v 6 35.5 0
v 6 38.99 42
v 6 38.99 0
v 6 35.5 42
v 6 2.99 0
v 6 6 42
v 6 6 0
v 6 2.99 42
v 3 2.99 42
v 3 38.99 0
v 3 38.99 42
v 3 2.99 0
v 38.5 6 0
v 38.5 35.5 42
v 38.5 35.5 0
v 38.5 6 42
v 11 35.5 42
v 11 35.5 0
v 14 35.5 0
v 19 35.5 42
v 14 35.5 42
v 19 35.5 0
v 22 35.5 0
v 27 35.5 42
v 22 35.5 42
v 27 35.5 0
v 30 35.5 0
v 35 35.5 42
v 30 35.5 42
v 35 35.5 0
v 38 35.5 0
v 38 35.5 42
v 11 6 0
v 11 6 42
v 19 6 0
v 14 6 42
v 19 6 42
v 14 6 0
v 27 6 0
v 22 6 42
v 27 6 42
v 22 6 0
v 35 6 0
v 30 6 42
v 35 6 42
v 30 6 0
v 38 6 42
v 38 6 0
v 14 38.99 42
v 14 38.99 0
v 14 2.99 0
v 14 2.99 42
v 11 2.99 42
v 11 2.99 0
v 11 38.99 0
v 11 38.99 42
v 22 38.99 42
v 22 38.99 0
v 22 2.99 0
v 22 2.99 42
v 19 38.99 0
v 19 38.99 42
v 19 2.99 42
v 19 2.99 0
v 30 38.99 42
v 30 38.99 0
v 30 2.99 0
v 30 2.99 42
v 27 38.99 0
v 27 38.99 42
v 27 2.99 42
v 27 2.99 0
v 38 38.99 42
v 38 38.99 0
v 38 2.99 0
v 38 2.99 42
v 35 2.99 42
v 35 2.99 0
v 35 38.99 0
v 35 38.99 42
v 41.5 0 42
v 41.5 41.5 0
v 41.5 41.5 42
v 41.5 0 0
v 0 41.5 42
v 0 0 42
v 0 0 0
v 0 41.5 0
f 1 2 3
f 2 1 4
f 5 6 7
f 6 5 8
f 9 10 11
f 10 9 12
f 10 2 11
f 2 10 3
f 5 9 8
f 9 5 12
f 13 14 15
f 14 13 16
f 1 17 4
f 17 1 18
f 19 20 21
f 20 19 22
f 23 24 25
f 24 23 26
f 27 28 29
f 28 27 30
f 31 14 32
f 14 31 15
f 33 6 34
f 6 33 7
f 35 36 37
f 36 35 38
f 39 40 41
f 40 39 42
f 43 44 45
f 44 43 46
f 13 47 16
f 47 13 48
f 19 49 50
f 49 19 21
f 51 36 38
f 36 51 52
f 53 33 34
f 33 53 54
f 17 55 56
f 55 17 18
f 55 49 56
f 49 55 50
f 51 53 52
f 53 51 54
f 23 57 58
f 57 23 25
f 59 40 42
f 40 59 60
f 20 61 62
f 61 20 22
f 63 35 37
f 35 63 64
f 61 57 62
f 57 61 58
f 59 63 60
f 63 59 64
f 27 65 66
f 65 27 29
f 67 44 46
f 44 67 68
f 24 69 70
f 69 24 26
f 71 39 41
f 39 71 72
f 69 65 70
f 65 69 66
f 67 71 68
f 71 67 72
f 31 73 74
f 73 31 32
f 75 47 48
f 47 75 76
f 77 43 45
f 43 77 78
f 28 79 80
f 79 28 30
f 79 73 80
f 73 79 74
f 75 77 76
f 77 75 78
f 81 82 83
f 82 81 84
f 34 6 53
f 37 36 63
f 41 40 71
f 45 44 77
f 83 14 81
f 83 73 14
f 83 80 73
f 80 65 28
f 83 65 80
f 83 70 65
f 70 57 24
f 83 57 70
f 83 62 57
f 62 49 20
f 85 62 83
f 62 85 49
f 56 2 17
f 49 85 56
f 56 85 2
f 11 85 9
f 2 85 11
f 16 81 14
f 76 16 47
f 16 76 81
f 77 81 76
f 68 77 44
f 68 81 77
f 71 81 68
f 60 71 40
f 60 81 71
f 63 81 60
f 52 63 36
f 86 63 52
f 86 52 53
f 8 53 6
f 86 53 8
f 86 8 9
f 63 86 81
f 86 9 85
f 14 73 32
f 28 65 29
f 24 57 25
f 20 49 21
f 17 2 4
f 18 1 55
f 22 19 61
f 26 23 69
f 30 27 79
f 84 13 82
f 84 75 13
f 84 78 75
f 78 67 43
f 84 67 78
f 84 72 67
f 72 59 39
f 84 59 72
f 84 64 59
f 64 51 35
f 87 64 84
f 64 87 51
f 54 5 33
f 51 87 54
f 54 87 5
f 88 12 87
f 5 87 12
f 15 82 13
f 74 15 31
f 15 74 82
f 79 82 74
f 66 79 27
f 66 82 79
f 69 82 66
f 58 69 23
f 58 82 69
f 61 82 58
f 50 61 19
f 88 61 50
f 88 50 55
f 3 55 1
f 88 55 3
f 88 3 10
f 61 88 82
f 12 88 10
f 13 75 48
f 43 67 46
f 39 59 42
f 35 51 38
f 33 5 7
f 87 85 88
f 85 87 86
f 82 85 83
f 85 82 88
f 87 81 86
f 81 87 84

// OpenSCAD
/* [Hidden] */
// Gridfinity

gridfinity_xy_to_mm = 42;
gridfinity_z_to_mm = 7;
gridfinity_tolerance = 0.5;

// rails
rail_depth = 3;
horizontal = 1;
vertical = 2;
rail_slide_depth = 3;

// Offsets to prevent impossibly thin artifacts
removal = -0.01;
addition = 0.01;

// Variables to edit
/* [Gridfinity] */
// Length
gridfinity_x = 1;
// Width
gridfinity_y = 1;
// Height
gridfinity_z = 6;
// How much extra material to leave between exterior and ridges.
gridfinity_wall_thickness = 3;

/* [Rails] */
// How big are the ridges cutouts.
rail_thickness = 3;
// How far between each ridge.
rail_spacing = 5;
// Orientation of the ridges
rail_direction = 2; // [1:horizontal, 2:vertical]


difference(){
    cube([gridfinity_x * gridfinity_xy_to_mm - gridfinity_tolerance,
        gridfinity_y * gridfinity_xy_to_mm - gridfinity_tolerance,
        gridfinity_z * gridfinity_z_to_mm],false);
    
    
    if(rail_direction == vertical){
        for(i = [gridfinity_wall_thickness:rail_spacing + rail_thickness:gridfinity_x * gridfinity_xy_to_mm ]){
            if(! (i+rail_thickness > gridfinity_x * gridfinity_xy_to_mm - gridfinity_wall_thickness))
            {
                translate([i,removal + gridfinity_wall_thickness,removal])
                    cube(
                        [rail_thickness, 
                        gridfinity_y * gridfinity_xy_to_mm - gridfinity_wall_thickness*2,
                        gridfinity_z*gridfinity_z_to_mm + addition*2]);
            }

            translate([gridfinity_wall_thickness,gridfinity_wall_thickness+rail_depth,removal])
                cube([gridfinity_x * gridfinity_xy_to_mm - gridfinity_tolerance - gridfinity_wall_thickness*2,
                    gridfinity_y * gridfinity_xy_to_mm - gridfinity_tolerance- gridfinity_wall_thickness*2 - rail_depth*2,
                    gridfinity_z * gridfinity_z_to_mm + addition*2],false);
        }

    }
    else if(rail_direction == horizontal){
        for(i = [gridfinity_wall_thickness:rail_spacing + rail_thickness:gridfinity_z * gridfinity_z_to_mm ]){
            if(! (i+rail_thickness > gridfinity_z * gridfinity_z_to_mm - gridfinity_wall_thickness)){
                    translate([removal,removal + gridfinity_wall_thickness,i])
                        cube(
                            [ gridfinity_x*gridfinity_xy_to_mm, 
                            gridfinity_y * gridfinity_xy_to_mm - gridfinity_wall_thickness * 2,
                            rail_thickness]);
            }

            translate([removal,gridfinity_wall_thickness+rail_depth,gridfinity_wall_thickness])
                cube([gridfinity_x * gridfinity_xy_to_mm - gridfinity_tolerance  + addition*2,
                    gridfinity_y * gridfinity_xy_to_mm - gridfinity_tolerance- gridfinity_wall_thickness*2 - rail_depth*2,
                    gridfinity_z * gridfinity_z_to_mm  - gridfinity_wall_thickness*2],false);
        }
    }
    else {
        echo("No rail direction set");
    }
}
